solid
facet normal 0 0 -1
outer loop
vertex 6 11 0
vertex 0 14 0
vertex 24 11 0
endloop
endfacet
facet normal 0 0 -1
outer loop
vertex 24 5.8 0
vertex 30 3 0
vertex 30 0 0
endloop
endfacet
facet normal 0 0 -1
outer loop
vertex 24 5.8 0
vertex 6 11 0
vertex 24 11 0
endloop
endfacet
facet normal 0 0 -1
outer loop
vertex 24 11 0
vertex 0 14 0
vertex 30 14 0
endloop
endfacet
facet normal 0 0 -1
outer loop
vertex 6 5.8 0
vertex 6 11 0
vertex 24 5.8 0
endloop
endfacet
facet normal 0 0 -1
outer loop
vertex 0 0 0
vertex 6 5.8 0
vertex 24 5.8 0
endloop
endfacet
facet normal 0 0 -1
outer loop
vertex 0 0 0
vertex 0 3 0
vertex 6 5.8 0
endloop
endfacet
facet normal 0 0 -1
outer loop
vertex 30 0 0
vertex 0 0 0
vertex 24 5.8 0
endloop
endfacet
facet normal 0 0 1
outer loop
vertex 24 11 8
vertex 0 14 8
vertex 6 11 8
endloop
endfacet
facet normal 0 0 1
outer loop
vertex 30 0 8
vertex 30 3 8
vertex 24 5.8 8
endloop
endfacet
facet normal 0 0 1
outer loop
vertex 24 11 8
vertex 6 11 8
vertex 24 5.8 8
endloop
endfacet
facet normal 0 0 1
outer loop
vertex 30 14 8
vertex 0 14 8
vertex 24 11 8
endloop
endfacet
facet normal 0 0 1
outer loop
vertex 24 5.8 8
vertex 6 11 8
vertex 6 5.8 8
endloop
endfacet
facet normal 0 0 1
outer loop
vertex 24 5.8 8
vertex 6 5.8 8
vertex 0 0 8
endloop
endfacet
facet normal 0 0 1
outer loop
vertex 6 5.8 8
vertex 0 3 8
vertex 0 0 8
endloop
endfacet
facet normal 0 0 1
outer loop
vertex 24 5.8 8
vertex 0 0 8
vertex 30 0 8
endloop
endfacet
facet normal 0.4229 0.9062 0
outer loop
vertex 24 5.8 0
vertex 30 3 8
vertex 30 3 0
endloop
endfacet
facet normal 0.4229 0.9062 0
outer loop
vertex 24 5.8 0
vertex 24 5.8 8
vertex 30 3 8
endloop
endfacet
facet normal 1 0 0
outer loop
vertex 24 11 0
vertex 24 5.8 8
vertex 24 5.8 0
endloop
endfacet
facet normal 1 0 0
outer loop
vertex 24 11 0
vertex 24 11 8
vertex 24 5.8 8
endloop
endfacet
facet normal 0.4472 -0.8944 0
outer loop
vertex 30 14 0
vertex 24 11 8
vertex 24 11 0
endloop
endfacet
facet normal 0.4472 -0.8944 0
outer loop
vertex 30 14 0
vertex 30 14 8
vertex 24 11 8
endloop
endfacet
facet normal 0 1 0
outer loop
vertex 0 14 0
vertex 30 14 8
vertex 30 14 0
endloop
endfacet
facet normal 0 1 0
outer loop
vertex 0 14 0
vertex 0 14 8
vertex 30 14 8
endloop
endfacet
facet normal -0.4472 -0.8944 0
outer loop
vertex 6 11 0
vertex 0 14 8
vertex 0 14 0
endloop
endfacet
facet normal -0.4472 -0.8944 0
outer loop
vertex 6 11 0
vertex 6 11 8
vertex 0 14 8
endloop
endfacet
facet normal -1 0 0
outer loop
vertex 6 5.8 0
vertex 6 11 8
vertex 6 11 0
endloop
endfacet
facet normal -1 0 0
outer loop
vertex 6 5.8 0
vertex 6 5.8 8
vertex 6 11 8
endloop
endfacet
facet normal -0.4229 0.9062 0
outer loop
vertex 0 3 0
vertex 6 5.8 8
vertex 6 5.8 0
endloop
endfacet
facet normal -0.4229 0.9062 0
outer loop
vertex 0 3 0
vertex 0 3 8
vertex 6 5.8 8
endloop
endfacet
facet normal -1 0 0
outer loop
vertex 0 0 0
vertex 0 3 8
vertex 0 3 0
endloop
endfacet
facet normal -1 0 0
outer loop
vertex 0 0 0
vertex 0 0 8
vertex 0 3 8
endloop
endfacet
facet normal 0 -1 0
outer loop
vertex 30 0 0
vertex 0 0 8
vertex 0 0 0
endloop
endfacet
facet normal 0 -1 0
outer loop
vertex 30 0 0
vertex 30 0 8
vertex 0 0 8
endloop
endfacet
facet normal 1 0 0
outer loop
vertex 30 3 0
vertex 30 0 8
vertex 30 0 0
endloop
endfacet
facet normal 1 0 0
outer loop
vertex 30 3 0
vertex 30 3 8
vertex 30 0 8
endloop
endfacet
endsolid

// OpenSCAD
$fn = 32;

// ----------------------------------------------------------------------
// Key bar: dovetail key, 8 mm thick
// ----------------------------------------------------------------------

// --- parameters (mm) ---
profile_height = 8;       // extrusion height
profile_points = 10;      // points of the closed outline

profile = [[0, 0], [30, 0], [30, 3], [24, 5.8], [24, 11], [30, 14], [0, 14], [6, 11], [6, 5.8], [0, 3]];  // single closed polygon, 10 points, counter clockwise

// --- the one profile operation ---
linear_extrude(height = profile_height) polygon(points = profile);
